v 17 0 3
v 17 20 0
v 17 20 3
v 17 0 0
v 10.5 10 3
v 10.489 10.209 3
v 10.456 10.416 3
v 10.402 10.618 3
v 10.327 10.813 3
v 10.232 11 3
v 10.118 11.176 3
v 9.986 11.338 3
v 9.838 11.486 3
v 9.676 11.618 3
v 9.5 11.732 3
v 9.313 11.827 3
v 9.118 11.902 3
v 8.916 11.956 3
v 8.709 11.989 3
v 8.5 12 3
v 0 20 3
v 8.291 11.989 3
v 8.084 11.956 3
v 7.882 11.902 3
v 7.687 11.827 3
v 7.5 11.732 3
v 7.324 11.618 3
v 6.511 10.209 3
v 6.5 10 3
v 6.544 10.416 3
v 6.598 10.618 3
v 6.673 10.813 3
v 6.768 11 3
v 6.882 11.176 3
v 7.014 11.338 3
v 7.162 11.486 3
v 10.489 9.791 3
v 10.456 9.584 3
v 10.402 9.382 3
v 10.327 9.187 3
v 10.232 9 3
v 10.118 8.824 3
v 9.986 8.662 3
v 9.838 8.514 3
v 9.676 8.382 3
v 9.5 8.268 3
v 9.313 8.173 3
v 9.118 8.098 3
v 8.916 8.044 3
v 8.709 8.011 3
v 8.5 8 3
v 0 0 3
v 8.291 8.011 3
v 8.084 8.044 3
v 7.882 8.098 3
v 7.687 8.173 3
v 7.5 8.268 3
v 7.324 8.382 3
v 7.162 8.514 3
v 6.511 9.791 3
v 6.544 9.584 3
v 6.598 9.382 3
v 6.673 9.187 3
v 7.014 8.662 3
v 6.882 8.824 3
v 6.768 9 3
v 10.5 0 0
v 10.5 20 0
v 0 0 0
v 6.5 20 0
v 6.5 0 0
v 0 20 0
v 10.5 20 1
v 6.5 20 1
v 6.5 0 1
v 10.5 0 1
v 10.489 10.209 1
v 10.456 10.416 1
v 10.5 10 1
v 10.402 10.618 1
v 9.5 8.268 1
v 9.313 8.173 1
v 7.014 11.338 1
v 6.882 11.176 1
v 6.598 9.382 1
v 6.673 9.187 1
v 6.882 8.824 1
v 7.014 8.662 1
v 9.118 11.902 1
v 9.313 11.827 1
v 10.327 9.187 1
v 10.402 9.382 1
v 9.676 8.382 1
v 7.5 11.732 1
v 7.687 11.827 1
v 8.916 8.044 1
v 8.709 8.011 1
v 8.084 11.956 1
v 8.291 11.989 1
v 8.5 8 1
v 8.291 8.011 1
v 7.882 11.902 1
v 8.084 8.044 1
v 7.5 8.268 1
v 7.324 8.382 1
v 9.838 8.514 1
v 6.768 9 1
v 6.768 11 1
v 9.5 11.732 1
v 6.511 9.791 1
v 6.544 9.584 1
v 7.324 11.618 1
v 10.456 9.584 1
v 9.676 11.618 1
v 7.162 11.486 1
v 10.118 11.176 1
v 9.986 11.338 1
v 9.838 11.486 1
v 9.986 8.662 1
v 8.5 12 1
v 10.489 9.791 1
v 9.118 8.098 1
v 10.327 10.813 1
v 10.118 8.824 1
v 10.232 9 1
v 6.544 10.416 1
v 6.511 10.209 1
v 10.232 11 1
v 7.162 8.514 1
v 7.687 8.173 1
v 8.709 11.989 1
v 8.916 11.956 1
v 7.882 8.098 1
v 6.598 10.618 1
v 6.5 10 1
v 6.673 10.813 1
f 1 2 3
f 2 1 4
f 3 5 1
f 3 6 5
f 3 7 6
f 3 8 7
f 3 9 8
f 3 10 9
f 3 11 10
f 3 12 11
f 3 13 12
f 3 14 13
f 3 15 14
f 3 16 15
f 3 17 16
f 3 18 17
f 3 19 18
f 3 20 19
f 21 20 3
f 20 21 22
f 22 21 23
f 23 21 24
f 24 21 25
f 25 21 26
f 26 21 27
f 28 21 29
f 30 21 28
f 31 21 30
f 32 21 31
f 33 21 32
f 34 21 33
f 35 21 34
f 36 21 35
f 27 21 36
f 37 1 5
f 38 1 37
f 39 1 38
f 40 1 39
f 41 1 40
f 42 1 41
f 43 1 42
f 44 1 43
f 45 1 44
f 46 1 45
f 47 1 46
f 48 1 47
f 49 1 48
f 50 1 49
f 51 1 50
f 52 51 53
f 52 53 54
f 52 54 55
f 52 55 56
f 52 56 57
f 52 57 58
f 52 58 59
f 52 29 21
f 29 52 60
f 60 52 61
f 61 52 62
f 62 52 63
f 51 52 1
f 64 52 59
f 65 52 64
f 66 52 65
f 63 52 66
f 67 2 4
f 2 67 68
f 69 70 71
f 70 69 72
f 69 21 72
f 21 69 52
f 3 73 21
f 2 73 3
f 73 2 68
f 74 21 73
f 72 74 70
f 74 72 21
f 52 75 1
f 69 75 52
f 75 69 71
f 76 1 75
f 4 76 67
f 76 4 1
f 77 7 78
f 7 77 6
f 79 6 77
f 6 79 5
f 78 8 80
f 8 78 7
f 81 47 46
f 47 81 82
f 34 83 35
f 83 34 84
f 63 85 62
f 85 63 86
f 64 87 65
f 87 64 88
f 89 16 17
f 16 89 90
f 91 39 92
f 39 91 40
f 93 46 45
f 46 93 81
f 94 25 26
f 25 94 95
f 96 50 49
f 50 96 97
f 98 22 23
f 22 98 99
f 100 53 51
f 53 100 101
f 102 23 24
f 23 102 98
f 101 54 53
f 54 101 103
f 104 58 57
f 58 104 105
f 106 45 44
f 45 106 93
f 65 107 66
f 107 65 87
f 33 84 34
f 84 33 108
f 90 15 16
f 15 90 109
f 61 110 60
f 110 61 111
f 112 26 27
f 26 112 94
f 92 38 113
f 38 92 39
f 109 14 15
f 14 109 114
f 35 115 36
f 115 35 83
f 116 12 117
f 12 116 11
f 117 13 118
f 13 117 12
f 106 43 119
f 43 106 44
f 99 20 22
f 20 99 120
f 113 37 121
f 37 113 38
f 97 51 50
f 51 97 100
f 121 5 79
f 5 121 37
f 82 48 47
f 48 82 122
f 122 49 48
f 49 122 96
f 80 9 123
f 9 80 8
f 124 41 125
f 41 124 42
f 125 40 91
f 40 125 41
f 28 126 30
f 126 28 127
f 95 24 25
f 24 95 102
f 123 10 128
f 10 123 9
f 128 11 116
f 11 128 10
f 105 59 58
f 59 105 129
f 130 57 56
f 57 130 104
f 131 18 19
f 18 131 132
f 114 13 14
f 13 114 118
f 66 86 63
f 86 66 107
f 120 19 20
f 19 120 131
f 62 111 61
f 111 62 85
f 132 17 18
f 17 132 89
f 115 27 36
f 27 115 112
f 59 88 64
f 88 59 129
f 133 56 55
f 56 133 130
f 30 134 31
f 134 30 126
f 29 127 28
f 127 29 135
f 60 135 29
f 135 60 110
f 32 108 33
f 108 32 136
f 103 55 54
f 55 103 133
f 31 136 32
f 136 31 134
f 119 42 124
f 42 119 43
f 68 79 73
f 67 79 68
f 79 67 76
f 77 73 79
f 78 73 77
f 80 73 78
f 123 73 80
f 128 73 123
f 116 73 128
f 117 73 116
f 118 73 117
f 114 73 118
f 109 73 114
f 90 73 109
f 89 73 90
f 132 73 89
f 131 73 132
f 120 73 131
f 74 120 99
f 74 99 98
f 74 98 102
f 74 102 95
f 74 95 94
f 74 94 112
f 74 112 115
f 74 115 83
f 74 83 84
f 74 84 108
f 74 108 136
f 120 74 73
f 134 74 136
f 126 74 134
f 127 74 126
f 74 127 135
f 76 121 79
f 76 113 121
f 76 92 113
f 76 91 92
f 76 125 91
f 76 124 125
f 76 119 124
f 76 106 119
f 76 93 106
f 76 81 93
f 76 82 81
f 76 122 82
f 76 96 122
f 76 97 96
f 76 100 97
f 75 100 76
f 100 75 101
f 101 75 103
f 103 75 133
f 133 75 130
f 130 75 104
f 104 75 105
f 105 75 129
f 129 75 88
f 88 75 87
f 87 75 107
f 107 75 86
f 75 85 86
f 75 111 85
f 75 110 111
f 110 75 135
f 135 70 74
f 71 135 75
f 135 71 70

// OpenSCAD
include <../Household/references.scad>

length_carriage_cage=20;
width_carriage_cage=17;
height_carriage_cage=3;

length_slot=length_carriage_cage;
width_slot=4;
height_slot=1;


module part(){
    cube([width_carriage_cage,length_carriage_cage,height_carriage_cage]);   
    }

module slots(){
    color("green"){
        translate([width_carriage_cage/2-(width_slot/2),0,0]){cube([width_slot,length_slot,height_slot]);}; 
        //translate([width_carriage_cage/2-(width_slot/2),0,height_carriage_cage-height_slot]){cube([width_slot,length_slot,height_slot]);}; 

    }
    }

module holes_for_screw(){
    color("red"){
    position_hole = [width_carriage_cage/2,length_carriage_cage/2,0];
    rotate_nuts=[0,0,0];
    custom_cylinder(
            rotate_input=rotate_nuts,
            translate_input=position_hole,
            diameter_object=4,
            height_object=height_carriage_cage);
    }
    }
module main(){
    difference(){
        part();
        holes_for_screw();
        slots();
    }

}
main();
    
